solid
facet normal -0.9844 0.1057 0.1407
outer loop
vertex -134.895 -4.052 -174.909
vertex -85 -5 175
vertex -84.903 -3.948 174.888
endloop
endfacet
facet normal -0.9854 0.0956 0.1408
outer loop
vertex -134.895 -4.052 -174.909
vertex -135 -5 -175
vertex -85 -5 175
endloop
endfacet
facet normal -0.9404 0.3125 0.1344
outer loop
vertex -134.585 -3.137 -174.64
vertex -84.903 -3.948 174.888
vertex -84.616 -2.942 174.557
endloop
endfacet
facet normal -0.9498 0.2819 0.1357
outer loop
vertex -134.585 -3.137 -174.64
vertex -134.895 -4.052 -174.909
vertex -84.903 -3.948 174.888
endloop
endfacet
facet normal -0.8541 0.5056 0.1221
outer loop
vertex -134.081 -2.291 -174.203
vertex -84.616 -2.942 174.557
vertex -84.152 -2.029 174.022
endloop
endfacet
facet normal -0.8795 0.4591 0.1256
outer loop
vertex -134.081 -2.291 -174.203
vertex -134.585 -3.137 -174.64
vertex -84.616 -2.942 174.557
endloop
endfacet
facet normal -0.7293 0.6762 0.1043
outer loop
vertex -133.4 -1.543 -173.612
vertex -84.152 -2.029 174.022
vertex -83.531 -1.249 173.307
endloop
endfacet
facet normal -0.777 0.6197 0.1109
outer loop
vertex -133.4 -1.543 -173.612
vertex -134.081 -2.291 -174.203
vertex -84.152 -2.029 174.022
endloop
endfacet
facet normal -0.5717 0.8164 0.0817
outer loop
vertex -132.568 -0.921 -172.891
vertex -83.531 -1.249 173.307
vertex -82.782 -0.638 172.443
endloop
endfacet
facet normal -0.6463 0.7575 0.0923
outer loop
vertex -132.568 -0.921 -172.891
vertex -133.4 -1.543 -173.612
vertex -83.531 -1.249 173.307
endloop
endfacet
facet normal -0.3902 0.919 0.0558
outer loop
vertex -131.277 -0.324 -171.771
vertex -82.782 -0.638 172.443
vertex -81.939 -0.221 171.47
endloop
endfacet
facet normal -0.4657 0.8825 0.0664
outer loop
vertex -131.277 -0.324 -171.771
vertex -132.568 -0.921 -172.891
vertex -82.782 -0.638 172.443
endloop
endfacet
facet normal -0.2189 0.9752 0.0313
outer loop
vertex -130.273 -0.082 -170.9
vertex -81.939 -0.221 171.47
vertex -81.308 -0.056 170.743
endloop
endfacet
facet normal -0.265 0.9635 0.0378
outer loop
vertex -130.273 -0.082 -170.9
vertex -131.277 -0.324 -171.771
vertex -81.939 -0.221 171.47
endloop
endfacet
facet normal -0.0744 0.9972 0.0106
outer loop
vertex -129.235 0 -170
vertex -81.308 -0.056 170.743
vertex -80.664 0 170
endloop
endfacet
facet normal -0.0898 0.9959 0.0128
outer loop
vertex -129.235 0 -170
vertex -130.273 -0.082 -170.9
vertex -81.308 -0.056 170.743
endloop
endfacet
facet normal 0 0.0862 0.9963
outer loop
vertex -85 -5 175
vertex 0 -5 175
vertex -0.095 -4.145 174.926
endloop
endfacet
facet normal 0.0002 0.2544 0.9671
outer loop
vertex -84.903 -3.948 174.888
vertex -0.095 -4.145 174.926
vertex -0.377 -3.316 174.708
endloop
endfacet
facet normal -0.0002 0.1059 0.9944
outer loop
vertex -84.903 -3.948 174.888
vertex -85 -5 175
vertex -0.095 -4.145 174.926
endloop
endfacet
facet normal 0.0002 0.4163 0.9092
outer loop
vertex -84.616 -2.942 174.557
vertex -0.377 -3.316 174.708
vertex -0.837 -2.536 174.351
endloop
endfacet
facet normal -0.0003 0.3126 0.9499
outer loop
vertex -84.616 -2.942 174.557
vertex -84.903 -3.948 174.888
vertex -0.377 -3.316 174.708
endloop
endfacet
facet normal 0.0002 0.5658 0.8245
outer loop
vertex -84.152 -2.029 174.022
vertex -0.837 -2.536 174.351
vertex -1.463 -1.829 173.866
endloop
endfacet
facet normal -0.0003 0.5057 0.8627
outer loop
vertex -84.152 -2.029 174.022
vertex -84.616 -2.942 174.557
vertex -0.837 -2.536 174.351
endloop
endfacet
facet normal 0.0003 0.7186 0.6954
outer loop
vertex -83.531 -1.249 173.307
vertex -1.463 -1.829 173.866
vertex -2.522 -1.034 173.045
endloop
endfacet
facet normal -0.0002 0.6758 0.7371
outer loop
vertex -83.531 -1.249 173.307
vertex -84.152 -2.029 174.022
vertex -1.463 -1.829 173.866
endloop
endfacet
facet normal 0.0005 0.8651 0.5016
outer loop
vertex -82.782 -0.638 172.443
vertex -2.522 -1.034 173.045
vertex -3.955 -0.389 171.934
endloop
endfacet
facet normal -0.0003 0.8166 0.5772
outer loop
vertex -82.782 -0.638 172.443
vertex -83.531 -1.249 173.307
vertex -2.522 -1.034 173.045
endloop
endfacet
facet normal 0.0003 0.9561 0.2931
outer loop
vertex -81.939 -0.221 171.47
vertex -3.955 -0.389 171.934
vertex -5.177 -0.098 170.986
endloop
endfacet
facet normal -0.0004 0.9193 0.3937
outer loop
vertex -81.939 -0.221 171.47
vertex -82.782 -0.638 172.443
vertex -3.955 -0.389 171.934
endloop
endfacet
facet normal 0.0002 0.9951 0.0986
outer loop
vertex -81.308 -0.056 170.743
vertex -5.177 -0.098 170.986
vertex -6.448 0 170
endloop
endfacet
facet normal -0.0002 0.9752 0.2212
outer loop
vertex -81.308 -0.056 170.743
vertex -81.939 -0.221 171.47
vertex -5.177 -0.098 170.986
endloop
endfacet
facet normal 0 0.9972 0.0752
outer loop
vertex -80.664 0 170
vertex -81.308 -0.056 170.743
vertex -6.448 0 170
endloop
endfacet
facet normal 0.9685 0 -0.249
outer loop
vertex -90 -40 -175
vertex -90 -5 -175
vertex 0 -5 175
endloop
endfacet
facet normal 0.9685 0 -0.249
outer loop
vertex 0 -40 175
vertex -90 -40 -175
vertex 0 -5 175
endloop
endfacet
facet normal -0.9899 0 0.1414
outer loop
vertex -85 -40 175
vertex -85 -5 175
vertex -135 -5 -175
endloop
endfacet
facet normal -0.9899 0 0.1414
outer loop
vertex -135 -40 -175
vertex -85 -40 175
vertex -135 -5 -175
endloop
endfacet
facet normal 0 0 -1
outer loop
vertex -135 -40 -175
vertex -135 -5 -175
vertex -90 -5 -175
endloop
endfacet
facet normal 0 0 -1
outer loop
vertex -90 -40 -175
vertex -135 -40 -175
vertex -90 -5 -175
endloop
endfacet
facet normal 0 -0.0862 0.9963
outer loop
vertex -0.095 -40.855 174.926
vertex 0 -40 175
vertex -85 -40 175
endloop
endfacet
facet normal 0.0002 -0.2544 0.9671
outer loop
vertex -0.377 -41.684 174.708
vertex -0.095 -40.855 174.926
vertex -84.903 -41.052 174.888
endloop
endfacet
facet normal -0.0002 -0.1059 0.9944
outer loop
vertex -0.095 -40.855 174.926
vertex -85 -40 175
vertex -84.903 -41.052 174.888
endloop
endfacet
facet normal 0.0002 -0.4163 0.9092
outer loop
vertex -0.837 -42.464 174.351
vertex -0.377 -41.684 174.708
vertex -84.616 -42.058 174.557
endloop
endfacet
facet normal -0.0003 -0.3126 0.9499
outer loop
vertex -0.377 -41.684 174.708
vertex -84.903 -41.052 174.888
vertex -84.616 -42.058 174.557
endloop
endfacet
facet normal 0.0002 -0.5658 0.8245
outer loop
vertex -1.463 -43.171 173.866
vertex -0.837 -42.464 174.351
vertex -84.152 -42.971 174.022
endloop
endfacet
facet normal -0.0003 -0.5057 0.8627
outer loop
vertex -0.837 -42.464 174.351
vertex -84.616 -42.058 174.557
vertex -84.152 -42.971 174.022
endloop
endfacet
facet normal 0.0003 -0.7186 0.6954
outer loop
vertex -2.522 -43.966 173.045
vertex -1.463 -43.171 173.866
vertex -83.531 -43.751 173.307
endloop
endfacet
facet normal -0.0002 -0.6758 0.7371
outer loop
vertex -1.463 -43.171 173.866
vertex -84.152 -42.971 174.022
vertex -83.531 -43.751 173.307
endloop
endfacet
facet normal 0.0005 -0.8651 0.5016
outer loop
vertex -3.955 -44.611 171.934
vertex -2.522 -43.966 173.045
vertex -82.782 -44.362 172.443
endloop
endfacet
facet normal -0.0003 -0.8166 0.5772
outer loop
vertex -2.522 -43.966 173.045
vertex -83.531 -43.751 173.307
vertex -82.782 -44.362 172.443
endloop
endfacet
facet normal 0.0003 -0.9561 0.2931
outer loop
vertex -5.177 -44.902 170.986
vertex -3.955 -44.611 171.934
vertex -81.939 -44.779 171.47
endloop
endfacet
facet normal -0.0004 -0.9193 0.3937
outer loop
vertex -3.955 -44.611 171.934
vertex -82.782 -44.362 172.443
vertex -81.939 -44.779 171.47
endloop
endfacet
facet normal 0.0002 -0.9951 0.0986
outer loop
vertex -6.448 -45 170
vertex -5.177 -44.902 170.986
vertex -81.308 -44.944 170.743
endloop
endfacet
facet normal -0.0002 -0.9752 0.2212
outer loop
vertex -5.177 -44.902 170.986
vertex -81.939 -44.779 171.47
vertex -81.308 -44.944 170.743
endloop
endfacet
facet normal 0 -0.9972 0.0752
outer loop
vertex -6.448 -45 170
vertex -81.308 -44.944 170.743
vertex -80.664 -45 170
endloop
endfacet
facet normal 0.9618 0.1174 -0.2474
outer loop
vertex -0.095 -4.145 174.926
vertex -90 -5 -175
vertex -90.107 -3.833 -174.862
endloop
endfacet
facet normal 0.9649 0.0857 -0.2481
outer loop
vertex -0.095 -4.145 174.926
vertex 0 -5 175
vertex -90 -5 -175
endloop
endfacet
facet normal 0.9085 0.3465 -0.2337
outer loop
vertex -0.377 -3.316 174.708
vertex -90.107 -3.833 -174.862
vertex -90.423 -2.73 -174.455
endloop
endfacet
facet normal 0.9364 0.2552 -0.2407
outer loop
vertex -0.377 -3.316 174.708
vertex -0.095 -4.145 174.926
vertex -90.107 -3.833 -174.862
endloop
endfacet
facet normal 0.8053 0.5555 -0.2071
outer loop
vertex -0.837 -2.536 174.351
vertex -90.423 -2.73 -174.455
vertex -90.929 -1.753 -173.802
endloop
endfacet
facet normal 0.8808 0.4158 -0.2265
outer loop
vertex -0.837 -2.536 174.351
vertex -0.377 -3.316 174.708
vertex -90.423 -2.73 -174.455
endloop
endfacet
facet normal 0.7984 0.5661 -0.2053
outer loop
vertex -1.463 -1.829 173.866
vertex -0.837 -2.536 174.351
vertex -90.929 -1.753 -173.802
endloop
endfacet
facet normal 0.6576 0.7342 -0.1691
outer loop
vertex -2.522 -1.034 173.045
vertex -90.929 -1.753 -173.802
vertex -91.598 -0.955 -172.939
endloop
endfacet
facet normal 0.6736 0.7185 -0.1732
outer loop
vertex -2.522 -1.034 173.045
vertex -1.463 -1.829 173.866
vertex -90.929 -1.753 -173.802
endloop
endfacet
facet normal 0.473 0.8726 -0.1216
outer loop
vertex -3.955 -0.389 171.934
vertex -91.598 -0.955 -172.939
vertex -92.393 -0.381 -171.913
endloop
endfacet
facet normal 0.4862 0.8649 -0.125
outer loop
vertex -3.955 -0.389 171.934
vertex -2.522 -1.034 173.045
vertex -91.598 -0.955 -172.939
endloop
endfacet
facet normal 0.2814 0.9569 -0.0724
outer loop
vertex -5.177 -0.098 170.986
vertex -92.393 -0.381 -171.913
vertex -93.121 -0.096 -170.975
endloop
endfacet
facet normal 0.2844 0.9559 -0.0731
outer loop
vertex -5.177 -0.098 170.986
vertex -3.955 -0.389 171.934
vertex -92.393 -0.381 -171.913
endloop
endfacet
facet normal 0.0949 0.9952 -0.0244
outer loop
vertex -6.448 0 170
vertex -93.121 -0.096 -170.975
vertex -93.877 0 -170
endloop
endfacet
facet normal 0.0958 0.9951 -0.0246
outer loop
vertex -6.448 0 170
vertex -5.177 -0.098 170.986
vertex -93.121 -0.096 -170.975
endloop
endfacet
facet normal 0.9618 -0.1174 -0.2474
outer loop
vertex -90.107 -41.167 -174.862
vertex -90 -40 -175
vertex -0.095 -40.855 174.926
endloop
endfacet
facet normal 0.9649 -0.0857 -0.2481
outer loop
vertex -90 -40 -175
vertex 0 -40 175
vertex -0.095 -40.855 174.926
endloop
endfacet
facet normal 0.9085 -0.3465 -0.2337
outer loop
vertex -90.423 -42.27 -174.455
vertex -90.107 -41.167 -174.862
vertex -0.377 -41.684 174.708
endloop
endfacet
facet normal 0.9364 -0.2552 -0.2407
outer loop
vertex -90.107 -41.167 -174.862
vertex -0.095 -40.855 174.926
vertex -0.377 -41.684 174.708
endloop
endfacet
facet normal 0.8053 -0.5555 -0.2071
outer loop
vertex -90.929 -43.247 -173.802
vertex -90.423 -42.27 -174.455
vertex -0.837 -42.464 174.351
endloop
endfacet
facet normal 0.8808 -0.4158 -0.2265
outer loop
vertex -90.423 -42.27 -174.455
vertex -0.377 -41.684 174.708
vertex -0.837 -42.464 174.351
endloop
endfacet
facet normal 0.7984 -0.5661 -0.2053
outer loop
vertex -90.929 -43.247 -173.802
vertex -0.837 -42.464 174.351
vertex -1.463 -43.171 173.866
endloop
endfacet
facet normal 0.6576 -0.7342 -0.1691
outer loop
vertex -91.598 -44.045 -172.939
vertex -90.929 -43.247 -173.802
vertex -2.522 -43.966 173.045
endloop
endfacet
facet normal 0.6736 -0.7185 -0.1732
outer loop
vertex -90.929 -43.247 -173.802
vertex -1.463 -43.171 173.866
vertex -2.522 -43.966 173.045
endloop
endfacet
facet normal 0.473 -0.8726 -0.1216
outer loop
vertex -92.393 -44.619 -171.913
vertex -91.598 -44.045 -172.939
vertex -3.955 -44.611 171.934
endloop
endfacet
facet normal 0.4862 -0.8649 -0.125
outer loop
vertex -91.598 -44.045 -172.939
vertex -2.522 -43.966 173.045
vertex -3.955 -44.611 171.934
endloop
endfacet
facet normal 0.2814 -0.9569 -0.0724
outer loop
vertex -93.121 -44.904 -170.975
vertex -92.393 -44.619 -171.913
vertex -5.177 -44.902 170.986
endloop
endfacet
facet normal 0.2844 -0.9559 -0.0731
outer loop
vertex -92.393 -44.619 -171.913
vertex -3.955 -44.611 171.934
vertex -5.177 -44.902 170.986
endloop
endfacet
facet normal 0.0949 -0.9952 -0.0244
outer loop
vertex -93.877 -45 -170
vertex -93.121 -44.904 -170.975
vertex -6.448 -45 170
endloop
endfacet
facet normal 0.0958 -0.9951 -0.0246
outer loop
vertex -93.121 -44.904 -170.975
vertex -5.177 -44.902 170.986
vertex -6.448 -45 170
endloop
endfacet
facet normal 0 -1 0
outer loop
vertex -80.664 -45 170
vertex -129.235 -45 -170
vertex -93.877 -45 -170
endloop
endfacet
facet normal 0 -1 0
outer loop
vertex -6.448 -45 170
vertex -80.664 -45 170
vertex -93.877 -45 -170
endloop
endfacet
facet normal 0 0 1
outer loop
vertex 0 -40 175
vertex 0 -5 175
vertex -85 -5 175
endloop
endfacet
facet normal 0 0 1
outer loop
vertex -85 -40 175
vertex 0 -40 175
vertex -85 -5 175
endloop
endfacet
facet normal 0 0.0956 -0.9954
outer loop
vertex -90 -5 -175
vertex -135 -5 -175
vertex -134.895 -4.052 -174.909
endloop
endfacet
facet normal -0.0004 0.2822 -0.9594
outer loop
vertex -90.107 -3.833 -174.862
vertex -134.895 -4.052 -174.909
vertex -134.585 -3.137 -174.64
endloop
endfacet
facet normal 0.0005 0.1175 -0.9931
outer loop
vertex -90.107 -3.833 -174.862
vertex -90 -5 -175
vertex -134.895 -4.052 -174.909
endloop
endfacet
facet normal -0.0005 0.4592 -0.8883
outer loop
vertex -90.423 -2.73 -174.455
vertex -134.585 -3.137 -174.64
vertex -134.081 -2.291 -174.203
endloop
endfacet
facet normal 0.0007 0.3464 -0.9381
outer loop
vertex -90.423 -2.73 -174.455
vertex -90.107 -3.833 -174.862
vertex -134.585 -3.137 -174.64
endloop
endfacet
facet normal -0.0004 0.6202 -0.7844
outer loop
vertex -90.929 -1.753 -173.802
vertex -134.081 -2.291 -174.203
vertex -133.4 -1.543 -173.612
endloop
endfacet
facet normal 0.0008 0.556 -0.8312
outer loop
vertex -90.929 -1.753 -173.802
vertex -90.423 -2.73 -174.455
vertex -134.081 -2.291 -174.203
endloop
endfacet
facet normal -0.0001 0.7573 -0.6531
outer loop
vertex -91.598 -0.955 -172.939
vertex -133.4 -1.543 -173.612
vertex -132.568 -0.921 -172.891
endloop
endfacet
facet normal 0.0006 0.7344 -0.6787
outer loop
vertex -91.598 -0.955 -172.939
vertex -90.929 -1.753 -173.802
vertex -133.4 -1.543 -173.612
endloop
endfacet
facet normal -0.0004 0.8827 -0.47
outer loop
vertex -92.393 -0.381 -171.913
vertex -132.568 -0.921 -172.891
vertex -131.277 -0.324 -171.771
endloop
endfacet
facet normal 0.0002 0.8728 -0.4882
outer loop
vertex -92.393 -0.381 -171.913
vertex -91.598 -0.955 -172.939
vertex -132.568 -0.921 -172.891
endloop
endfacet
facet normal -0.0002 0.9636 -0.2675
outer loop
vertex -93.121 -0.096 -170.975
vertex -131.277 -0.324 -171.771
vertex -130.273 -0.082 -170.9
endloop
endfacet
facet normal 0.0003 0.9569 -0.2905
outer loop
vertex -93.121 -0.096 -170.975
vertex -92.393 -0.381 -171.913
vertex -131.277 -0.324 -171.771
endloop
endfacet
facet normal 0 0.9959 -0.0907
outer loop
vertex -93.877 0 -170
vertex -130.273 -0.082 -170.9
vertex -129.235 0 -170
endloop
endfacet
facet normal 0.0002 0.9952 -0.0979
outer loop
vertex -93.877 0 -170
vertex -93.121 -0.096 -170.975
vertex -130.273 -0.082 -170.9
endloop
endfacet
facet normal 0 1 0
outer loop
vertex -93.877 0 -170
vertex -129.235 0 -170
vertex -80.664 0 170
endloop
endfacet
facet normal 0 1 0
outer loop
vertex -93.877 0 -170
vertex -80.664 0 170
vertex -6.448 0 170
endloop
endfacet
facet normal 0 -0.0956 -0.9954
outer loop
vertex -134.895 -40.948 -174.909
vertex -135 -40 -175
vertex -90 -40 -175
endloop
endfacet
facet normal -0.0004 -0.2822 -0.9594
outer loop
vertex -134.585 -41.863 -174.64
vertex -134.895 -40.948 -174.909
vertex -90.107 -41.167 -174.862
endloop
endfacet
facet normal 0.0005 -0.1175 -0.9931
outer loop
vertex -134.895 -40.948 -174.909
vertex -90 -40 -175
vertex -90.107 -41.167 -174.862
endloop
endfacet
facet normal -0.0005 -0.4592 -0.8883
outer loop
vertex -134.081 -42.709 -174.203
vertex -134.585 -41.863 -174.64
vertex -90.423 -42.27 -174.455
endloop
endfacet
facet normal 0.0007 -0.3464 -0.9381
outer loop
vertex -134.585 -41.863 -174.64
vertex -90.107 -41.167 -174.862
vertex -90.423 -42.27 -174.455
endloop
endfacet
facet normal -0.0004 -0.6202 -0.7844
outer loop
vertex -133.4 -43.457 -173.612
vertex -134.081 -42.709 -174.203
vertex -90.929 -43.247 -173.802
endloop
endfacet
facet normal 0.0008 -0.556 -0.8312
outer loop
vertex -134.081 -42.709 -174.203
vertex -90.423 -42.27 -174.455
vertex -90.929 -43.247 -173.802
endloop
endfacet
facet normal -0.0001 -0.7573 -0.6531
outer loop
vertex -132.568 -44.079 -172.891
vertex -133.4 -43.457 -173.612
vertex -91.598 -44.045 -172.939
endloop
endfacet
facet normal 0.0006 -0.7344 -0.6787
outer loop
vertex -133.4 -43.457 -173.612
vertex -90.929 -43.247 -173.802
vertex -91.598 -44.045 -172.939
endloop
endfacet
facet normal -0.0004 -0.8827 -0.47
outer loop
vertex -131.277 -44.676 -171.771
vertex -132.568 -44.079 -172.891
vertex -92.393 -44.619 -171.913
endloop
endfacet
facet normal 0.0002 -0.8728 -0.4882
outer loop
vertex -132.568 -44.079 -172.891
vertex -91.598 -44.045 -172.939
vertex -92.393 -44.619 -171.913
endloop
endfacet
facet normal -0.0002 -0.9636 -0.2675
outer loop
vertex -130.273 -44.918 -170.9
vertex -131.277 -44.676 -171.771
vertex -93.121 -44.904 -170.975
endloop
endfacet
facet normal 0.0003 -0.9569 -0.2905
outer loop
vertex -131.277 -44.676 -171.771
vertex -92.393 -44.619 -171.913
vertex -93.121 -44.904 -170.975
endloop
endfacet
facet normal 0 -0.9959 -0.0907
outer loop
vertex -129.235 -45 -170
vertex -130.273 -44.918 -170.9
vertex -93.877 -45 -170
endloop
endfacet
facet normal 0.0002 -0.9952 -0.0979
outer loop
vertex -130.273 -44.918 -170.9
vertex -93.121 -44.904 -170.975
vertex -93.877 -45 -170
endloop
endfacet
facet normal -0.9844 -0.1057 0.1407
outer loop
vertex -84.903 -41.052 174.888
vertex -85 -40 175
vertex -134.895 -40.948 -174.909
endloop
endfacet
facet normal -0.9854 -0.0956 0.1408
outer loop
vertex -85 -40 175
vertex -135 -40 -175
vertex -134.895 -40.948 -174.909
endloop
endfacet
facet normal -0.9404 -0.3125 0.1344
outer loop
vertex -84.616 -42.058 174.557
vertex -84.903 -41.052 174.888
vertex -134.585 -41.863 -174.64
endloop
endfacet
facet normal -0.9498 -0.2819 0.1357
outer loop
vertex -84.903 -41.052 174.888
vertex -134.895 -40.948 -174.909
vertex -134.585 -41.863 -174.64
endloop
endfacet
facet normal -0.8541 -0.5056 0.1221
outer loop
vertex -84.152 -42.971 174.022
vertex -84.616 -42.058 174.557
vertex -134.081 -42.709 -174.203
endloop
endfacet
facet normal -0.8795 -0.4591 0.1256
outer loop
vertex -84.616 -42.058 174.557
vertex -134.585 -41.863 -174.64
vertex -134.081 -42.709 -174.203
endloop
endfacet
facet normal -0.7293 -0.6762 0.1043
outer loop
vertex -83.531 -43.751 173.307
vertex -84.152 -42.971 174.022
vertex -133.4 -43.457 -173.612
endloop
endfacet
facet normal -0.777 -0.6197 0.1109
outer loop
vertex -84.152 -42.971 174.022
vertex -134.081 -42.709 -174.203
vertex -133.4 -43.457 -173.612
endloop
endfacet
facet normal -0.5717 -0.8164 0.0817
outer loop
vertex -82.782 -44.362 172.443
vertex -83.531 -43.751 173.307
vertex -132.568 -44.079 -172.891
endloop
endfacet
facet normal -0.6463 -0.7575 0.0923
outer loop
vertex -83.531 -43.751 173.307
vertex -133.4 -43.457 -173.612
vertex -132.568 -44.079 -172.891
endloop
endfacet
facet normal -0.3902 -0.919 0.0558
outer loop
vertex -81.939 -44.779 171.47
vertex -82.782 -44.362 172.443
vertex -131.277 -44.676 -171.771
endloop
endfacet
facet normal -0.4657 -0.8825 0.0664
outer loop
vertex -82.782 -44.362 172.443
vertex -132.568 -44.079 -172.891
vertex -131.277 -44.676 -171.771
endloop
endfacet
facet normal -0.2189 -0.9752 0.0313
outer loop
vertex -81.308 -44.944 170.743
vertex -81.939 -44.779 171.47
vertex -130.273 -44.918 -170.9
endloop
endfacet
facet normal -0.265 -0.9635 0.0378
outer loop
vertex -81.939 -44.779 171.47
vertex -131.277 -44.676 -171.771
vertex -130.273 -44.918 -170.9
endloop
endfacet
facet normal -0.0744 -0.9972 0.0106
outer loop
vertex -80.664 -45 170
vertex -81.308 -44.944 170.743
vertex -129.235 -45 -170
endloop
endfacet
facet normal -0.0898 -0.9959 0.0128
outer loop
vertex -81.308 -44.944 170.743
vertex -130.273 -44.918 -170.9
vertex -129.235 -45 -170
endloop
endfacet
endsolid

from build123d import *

# Parameters (mm, degrees)
F1_DEPTH = 45
F2_R     = 5


with BuildPart() as f1:
    # F0 (on Front) → F1 (new body)
    with BuildSketch(Plane.XZ):
        Polygon((0, 175), (-85, 175), (-135, -175), (-90, -175), align=None)
    extrude(amount=F1_DEPTH)

    # F2
    f2_edges = [f1.edges().sort_by_distance(p)[0] for p in [
        (-42.5, -45, 175),
        (-110, -45, 0),
        (-112.5, -45, -175),
        (-45, -45, 0),
        (-42.5, 0, 175),
        (-110, 0, 0),
        (-112.5, 0, -175),
        (-45, 0, 0),
    ]]
    fillet(f2_edges, radius=F2_R)


solid = f1.part
